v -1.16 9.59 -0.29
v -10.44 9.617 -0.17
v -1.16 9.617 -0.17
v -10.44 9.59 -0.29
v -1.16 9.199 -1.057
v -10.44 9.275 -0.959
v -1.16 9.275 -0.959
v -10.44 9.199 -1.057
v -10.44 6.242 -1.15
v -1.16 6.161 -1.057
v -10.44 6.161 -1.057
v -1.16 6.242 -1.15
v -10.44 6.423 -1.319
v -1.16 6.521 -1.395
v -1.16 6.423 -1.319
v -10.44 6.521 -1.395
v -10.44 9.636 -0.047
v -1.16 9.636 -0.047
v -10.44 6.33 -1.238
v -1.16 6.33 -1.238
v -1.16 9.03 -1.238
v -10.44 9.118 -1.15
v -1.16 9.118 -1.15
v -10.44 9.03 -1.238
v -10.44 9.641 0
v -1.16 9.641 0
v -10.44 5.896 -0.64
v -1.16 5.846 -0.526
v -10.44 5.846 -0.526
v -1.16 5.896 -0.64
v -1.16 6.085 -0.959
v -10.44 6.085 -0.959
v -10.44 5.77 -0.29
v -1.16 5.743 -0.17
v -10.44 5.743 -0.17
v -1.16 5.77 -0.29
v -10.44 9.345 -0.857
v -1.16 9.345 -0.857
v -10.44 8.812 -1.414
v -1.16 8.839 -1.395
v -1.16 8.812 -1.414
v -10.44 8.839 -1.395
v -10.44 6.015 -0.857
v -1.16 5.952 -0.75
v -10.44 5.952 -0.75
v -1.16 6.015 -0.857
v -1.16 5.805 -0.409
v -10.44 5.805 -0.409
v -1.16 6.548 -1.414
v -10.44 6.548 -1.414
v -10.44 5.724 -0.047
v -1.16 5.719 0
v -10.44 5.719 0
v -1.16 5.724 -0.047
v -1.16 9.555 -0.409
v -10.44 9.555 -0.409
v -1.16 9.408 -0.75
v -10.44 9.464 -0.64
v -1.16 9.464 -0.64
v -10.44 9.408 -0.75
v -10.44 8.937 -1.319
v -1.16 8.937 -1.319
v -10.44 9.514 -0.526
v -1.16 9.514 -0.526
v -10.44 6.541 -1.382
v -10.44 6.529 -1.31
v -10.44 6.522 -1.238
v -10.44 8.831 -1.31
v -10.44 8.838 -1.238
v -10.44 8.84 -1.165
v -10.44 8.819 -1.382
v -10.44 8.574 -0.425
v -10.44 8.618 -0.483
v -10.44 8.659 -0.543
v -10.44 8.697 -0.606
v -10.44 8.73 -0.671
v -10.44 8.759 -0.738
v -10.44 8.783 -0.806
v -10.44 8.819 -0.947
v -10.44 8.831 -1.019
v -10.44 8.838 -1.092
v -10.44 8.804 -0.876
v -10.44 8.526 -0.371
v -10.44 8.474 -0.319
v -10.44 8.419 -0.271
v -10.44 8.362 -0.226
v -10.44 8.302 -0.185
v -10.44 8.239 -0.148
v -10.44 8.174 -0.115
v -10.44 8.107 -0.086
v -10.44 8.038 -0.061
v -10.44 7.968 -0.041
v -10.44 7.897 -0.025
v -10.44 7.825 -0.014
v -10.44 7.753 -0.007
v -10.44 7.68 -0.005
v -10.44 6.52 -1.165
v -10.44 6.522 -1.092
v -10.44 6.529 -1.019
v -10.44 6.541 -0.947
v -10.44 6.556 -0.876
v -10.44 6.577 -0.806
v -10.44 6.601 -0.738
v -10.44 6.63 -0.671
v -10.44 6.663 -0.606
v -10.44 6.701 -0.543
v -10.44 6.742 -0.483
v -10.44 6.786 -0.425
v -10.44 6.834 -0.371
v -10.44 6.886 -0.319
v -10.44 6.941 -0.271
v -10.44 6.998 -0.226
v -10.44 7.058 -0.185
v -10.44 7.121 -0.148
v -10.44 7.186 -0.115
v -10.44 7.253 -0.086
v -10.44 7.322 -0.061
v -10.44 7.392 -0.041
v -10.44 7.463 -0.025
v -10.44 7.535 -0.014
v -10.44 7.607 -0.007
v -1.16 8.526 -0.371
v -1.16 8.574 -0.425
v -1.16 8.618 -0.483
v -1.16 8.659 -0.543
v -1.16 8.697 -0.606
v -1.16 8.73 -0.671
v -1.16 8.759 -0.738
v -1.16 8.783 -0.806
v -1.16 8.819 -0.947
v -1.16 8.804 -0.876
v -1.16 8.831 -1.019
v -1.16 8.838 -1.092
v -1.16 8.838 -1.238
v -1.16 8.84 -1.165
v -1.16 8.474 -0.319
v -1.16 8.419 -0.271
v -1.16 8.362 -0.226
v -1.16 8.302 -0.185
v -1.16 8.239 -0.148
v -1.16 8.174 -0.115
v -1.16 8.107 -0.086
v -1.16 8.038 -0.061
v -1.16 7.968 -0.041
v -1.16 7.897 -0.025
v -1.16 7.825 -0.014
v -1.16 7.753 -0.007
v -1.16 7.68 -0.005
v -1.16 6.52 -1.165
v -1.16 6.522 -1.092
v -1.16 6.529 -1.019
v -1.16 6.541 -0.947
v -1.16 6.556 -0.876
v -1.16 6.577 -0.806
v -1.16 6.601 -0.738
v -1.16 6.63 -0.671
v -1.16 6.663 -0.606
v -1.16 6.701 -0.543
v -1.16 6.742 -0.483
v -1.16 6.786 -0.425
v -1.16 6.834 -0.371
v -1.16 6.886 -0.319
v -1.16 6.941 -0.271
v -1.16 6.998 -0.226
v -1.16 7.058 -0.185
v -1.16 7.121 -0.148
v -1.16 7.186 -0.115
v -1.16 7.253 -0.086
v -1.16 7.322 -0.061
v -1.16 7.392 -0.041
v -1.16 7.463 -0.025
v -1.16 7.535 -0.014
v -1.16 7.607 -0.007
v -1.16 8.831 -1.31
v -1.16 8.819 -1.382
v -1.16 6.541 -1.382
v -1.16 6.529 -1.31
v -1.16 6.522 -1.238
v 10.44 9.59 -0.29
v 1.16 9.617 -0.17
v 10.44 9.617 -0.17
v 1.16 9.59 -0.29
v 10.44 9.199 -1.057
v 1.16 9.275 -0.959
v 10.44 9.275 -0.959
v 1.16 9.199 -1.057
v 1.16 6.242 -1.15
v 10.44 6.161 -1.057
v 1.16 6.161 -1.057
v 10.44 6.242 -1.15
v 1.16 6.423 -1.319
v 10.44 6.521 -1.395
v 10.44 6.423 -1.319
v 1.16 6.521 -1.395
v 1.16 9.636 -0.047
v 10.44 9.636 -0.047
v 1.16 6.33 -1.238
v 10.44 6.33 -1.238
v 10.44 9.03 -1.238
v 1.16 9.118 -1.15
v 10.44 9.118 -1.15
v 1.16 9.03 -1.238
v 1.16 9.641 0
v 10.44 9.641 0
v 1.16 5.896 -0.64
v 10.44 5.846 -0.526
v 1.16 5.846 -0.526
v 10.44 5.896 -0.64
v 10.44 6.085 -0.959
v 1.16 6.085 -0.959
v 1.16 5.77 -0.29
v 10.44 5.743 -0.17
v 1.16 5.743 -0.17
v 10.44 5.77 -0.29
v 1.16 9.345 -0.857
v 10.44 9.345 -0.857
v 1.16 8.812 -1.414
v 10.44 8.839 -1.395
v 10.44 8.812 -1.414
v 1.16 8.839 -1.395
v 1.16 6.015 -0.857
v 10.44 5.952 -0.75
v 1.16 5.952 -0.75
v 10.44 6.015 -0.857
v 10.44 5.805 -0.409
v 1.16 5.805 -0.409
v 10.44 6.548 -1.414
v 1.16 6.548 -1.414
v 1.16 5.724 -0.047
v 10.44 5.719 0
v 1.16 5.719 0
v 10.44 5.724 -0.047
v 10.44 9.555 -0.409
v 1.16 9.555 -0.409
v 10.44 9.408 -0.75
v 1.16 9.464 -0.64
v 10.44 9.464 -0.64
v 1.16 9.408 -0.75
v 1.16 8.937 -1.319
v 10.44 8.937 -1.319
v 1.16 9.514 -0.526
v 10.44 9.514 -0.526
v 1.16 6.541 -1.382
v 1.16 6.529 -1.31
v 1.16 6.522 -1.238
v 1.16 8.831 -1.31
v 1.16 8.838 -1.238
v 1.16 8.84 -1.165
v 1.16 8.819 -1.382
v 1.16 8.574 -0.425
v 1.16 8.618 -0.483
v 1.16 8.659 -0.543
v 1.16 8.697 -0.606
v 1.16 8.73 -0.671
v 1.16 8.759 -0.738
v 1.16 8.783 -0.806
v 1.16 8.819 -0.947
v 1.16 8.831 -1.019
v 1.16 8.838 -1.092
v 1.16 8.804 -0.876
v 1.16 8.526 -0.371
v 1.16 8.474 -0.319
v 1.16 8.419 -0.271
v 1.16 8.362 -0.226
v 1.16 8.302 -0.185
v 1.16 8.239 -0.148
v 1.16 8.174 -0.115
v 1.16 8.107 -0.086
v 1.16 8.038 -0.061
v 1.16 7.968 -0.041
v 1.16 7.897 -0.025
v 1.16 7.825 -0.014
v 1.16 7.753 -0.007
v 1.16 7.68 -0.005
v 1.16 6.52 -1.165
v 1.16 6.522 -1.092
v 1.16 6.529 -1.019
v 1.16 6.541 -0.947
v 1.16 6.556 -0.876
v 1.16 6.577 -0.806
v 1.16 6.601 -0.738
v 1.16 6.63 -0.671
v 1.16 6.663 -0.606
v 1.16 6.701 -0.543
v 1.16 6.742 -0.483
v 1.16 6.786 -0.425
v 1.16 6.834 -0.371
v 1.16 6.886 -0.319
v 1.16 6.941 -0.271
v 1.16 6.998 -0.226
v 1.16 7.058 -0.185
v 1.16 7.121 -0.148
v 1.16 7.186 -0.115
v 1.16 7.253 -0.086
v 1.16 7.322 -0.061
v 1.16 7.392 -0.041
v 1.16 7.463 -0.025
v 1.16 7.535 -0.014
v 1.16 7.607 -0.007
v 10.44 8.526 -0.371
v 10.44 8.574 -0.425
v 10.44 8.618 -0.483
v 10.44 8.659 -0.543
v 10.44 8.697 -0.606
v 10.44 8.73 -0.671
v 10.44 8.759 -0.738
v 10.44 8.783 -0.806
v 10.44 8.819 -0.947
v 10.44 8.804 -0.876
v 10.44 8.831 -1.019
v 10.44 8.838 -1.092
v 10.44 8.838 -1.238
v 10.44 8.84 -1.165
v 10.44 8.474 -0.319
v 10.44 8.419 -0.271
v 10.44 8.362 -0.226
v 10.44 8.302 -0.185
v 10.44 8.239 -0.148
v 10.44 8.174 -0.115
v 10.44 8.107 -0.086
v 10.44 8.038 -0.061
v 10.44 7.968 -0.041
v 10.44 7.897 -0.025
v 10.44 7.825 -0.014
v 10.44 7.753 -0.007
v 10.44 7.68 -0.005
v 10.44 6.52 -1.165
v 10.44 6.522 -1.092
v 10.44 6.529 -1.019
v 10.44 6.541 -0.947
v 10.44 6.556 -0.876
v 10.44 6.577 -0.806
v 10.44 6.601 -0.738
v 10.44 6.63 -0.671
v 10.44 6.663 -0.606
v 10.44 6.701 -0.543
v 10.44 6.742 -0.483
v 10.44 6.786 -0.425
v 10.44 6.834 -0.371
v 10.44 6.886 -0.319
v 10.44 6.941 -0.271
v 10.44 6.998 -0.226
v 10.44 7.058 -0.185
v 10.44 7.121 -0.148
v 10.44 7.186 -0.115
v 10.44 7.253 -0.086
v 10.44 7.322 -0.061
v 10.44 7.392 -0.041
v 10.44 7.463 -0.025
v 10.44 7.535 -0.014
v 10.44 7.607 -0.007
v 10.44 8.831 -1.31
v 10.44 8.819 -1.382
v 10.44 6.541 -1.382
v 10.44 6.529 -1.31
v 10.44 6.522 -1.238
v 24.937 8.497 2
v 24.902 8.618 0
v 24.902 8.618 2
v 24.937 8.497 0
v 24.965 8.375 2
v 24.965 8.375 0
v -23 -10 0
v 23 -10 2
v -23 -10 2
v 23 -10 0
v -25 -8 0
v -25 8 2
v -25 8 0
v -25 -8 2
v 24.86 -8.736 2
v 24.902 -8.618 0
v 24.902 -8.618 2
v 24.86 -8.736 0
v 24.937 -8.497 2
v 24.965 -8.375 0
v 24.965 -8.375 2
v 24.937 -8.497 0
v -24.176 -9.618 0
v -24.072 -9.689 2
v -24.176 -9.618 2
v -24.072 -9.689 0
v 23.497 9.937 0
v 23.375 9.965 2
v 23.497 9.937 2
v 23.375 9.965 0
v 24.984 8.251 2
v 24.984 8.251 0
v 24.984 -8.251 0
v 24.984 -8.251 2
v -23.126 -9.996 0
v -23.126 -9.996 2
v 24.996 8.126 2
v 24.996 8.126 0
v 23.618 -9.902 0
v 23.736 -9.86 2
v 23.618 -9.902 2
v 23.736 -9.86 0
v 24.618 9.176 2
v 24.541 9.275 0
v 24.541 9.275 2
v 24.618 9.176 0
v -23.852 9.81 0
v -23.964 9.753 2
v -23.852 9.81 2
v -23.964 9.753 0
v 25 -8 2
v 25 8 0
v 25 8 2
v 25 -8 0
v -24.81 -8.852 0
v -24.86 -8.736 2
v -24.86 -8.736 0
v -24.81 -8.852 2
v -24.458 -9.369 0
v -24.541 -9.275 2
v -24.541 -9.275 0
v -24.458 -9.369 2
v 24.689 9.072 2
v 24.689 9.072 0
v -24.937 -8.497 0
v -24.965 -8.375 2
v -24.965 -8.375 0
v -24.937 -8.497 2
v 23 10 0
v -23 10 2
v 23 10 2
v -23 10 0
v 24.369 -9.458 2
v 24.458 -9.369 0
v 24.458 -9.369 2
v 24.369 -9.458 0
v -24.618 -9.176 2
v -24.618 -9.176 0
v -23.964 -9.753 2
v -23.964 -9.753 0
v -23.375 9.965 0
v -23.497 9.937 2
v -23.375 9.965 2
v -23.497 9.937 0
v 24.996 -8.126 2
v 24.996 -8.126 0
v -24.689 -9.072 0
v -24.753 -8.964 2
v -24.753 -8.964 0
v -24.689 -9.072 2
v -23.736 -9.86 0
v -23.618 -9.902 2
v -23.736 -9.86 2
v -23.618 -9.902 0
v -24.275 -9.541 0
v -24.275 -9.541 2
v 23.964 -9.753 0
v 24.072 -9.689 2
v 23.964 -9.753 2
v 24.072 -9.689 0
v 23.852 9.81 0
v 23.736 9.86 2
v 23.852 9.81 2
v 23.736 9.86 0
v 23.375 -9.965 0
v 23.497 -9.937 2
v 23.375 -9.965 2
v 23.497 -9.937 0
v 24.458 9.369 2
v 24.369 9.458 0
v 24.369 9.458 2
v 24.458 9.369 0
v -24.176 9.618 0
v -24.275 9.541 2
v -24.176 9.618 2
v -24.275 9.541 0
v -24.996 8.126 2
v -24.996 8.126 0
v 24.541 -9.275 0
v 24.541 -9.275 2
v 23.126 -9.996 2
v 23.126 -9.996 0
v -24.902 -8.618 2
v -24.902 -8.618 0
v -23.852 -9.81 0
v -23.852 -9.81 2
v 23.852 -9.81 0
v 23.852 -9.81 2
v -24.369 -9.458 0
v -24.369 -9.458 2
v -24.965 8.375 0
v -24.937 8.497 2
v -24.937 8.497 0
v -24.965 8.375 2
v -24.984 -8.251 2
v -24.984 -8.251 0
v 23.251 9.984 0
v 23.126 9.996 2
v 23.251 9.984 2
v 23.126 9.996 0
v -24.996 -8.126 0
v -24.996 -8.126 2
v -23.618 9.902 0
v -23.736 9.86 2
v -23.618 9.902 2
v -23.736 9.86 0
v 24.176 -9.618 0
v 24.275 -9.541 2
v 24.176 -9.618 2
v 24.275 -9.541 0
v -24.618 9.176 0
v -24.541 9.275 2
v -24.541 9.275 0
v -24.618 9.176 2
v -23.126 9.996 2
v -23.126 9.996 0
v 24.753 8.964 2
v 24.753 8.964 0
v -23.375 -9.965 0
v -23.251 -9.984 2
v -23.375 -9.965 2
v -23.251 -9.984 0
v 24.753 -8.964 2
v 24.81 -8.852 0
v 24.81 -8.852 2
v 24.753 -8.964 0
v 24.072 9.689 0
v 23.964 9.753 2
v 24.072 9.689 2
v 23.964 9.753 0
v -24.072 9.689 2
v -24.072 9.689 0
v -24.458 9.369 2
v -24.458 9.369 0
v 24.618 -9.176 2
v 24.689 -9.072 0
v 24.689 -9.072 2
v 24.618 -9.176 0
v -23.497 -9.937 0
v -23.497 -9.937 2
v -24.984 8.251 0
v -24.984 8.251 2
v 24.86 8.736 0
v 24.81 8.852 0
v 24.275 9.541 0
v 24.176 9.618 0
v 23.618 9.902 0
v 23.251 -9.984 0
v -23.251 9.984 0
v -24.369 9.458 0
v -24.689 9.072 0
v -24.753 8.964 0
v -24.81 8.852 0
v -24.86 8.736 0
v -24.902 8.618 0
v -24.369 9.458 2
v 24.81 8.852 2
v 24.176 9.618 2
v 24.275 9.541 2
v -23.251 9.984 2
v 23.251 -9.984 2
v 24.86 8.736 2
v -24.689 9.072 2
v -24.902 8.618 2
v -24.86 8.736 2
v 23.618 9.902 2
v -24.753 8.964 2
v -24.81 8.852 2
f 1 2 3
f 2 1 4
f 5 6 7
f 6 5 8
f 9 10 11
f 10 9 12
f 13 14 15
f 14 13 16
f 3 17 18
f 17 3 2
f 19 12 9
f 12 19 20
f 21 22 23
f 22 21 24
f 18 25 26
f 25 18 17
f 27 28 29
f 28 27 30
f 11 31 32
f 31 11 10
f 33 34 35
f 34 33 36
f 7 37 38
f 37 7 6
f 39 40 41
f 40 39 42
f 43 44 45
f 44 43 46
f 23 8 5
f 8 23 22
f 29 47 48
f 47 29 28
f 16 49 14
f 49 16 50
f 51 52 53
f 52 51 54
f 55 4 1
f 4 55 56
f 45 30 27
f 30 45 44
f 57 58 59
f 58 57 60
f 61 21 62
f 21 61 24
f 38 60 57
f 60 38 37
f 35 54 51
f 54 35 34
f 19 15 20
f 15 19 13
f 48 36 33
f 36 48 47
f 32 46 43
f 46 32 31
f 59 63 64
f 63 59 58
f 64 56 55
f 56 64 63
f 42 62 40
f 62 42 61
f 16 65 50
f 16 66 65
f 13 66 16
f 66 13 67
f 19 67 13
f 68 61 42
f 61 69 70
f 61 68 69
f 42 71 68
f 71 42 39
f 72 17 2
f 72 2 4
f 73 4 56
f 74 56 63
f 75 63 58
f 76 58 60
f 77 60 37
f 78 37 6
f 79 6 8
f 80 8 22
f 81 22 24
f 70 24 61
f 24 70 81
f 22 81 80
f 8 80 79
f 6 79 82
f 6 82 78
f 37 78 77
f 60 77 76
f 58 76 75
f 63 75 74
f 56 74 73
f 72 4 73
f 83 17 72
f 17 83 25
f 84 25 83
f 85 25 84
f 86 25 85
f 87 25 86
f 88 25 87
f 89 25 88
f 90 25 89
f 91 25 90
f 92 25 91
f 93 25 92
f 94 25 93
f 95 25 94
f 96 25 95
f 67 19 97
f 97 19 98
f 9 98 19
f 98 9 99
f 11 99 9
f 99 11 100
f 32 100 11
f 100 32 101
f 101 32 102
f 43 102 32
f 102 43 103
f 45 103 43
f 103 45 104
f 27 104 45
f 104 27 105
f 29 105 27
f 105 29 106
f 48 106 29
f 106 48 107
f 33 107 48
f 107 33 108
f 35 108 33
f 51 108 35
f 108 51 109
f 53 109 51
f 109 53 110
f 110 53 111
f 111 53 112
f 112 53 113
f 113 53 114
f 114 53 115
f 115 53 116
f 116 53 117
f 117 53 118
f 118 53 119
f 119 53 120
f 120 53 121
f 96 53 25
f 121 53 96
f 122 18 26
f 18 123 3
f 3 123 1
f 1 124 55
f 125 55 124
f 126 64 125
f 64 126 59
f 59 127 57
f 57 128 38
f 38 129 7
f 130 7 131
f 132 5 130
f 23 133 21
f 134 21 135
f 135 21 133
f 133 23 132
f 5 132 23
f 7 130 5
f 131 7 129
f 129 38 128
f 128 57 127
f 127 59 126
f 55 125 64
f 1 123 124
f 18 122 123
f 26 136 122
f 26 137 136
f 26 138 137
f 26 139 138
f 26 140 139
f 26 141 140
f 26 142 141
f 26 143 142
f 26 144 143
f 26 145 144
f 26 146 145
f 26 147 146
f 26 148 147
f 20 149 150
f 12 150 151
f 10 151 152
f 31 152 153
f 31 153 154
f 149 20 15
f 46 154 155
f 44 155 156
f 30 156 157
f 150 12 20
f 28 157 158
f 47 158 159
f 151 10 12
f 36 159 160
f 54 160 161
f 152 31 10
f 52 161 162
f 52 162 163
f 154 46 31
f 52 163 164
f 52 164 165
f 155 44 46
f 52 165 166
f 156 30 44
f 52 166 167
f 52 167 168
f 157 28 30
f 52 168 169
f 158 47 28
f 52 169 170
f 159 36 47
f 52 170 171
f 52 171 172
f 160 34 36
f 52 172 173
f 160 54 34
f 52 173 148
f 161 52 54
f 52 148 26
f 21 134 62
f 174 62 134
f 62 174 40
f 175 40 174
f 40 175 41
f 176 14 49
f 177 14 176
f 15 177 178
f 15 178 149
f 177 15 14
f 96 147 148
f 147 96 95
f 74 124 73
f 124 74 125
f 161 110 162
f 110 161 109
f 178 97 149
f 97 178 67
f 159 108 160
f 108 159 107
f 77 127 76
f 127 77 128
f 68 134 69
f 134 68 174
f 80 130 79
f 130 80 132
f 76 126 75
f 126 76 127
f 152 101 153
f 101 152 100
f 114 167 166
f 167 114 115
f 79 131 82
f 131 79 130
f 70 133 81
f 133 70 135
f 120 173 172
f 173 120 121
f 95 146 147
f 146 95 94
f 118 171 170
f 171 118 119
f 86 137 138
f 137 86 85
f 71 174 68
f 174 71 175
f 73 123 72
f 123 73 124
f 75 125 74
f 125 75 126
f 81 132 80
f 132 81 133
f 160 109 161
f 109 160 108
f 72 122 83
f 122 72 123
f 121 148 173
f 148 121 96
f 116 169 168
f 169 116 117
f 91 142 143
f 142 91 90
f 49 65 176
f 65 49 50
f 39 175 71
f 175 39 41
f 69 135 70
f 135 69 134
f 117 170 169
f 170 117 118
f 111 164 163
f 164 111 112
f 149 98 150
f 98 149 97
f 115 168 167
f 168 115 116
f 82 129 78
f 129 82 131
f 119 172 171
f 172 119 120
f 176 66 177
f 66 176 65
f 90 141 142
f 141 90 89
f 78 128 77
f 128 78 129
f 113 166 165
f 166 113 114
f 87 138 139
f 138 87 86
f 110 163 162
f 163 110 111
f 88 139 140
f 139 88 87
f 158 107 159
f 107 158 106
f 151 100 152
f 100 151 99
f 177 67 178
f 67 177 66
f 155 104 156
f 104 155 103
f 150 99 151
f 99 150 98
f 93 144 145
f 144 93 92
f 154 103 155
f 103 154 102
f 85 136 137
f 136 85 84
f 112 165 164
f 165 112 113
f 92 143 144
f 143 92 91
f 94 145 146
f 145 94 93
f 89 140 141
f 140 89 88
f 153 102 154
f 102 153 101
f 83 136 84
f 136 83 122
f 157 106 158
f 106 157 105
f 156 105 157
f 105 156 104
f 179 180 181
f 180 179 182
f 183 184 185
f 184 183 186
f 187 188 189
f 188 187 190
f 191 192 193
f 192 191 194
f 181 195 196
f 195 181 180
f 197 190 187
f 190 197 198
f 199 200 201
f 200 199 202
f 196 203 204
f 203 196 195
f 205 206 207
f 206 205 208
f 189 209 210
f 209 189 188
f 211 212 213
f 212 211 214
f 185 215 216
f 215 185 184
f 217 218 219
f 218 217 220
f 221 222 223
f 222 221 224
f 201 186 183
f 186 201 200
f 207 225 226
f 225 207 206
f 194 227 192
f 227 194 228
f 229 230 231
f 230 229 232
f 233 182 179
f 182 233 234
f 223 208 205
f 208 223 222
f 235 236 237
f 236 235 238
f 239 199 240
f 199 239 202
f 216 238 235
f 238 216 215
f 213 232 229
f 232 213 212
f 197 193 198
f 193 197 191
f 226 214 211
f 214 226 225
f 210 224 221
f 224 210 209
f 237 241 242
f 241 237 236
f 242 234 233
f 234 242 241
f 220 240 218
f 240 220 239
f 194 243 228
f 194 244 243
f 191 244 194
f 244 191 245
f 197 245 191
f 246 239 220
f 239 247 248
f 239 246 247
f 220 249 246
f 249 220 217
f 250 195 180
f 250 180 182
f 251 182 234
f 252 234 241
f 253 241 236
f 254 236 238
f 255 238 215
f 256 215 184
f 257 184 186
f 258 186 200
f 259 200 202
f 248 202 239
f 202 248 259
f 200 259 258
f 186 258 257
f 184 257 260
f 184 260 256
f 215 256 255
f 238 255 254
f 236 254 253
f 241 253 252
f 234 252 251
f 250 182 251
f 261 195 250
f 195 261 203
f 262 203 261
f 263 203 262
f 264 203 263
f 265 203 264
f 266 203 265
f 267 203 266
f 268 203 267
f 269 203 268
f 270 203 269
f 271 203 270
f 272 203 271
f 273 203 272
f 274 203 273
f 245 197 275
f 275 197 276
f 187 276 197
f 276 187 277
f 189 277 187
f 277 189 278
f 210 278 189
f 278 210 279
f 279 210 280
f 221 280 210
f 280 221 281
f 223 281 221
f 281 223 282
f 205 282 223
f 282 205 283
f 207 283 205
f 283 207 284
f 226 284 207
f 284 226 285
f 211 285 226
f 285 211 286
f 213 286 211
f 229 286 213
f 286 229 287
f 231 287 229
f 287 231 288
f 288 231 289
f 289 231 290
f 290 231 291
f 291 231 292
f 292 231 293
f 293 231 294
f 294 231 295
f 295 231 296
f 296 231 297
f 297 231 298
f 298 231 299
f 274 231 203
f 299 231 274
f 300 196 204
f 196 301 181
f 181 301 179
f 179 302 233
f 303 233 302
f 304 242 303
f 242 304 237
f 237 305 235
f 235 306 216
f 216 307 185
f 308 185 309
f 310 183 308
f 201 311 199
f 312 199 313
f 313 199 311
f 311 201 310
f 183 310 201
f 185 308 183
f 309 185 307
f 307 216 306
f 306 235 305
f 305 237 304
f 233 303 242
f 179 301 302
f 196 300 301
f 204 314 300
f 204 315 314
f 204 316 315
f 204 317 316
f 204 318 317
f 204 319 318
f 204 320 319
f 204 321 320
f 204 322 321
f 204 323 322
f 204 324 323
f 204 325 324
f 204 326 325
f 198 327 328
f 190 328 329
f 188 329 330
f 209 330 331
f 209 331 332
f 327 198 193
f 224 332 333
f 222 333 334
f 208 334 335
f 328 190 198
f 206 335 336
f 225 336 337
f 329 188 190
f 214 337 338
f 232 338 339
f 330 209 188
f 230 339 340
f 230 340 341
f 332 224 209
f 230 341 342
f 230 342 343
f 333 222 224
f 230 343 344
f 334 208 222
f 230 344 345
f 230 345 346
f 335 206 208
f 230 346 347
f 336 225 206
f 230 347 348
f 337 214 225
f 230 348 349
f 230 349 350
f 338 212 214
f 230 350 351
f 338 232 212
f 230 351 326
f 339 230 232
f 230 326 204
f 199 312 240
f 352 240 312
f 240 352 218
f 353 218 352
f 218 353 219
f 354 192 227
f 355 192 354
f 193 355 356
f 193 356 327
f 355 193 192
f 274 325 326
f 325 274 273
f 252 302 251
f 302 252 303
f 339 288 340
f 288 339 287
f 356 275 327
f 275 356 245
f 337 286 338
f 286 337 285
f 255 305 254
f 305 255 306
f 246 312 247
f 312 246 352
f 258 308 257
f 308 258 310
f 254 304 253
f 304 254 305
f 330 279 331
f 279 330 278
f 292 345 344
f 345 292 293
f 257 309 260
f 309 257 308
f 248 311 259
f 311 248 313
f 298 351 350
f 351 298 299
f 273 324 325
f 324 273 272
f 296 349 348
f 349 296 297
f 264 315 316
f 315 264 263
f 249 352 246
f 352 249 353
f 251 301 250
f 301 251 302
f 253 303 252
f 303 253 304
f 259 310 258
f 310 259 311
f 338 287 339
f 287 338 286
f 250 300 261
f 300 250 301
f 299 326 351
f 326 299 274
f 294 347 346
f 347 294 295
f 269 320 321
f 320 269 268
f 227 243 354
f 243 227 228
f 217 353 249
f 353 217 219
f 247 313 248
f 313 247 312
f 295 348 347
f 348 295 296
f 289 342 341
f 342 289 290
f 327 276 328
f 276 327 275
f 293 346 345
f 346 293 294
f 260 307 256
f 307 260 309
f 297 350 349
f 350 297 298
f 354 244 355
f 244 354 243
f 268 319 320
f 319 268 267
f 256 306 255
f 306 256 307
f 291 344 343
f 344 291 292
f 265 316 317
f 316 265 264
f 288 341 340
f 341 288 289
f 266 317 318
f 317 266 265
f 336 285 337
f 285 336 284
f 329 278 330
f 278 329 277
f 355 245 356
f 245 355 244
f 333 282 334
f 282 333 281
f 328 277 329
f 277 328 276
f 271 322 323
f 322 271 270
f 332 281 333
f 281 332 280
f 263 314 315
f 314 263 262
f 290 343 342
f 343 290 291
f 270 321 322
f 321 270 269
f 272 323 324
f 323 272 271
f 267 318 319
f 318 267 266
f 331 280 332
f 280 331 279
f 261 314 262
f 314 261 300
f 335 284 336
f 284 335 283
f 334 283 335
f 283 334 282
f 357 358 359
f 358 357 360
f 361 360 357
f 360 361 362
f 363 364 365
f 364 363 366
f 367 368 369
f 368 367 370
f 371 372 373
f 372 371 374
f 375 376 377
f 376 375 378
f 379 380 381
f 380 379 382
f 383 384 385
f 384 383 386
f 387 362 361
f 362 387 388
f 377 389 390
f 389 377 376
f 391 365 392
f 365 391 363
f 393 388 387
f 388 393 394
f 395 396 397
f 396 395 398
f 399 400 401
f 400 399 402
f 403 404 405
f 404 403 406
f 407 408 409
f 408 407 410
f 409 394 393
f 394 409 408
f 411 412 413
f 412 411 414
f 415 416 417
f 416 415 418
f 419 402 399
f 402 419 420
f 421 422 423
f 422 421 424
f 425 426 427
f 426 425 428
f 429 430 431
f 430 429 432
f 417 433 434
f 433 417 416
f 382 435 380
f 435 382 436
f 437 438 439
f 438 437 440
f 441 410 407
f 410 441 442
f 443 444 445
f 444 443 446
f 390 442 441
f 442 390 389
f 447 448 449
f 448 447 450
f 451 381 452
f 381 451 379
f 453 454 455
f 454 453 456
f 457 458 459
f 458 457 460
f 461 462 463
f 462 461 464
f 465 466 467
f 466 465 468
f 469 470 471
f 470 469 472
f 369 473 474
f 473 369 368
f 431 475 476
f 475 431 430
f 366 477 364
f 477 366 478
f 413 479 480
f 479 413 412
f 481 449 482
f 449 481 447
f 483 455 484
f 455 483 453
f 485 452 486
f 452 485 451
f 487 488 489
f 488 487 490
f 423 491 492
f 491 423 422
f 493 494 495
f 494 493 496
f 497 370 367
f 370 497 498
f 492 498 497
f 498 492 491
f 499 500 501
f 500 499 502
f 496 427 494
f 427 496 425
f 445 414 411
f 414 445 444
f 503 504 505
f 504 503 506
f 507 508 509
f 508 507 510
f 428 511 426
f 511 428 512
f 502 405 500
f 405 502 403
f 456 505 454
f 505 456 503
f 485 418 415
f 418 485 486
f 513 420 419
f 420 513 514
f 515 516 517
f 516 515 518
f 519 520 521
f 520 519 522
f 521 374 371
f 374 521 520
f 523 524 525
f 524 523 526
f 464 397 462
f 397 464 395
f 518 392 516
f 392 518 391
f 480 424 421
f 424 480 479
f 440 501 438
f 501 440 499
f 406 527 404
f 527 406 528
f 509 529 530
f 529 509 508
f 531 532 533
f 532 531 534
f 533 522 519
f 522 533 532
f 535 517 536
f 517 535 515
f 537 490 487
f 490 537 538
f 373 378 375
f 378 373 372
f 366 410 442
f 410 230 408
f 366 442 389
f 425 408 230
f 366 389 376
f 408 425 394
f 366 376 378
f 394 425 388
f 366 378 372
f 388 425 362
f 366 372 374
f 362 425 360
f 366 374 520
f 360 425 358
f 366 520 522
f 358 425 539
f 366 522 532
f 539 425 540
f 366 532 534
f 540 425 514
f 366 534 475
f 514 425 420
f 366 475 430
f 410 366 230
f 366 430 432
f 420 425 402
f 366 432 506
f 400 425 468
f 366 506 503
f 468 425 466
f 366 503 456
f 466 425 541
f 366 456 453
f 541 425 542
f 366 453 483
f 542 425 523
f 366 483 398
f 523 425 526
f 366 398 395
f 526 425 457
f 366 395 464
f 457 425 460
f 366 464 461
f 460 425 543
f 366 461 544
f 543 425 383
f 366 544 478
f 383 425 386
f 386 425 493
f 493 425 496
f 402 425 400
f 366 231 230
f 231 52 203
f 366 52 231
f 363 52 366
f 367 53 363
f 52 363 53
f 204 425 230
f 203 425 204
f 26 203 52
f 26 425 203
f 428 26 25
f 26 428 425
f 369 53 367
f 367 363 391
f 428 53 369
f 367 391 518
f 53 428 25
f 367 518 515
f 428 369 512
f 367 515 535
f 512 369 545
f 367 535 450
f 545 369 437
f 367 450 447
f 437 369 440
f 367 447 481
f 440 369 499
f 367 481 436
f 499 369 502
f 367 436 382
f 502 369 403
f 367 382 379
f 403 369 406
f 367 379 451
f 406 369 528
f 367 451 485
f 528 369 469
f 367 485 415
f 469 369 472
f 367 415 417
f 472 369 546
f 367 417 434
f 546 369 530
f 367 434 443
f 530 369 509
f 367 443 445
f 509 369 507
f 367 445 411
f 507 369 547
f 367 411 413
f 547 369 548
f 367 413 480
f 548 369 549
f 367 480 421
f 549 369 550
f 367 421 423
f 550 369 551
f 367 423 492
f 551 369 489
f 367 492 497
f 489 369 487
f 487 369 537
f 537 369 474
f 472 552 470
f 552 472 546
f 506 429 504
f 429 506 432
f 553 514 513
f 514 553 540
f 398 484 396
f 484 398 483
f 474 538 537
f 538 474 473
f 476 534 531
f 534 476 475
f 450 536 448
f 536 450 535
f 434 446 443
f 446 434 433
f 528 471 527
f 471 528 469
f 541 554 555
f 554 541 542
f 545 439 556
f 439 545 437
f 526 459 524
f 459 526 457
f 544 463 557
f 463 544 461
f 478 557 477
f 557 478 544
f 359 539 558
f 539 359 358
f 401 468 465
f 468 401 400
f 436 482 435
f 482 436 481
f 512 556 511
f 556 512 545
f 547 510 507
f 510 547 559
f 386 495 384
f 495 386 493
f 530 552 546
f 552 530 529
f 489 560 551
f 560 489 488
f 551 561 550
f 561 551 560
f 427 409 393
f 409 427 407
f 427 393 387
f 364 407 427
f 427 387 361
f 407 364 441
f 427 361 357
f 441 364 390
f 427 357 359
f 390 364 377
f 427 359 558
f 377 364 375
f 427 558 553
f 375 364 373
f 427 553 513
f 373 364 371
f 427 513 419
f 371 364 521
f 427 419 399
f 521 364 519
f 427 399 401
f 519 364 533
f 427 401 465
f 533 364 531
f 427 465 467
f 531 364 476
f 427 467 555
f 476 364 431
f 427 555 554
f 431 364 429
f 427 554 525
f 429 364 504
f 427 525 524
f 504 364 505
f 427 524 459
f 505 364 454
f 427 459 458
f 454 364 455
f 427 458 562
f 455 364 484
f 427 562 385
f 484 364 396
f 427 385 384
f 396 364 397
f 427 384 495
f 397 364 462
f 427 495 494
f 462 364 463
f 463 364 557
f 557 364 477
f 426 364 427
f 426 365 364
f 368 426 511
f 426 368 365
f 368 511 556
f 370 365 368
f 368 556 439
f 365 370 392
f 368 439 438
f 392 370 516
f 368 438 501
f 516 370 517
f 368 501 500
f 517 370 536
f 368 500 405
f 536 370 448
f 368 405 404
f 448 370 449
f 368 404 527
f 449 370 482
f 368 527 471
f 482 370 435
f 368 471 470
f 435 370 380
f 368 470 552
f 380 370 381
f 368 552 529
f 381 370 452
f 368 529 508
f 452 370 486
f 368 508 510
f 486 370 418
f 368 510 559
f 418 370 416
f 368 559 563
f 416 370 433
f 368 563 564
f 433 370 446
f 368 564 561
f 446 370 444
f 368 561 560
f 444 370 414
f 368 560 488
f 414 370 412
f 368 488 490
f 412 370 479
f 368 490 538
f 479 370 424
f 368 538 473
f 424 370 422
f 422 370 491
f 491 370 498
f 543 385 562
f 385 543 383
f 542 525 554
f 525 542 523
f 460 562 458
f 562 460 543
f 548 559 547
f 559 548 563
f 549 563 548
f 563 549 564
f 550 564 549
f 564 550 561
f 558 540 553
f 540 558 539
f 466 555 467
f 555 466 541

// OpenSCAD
$labelWidth = 50; // [25:200]
$labelHeight = 20;
$labelThickness = 2;
$labelRadius = 2;

// Wire Shelf Parameters
$vertialWireThickness = 6;
$horizontalWireThickness = 2.32;
$distanceBetweenWires = 11.6;

$fn = 100;

module clip(horizontalWireThickness, distanceBetweenWires) {
    clipDiameter = horizontalWireThickness * 1.7;
    clipHeight = distanceBetweenWires * 0.80;

    difference() {
        cylinder(h = clipHeight, d = clipDiameter, center = true);

        // Cut the cylinder in half (we want a sem-cylinder)
        translate([0, clipDiameter / 4, 0])
        cube([clipDiameter, horizontalWireThickness, clipHeight * 1.1], center = true);

        // Now cut a void into the clip that will hold onto the wire part.
        translate([0, -horizontalWireThickness / 1.7, 0])
        cylinder(h = clipHeight * 1.1, d = horizontalWireThickness, center = true);
    }
}

$YOffsetForClips = $labelHeight/2-$horizontalWireThickness;
$ZOffsetForClips = .2;

// Clip #1
color("red")
translate([-($distanceBetweenWires * 0.80)/2-$horizontalWireThickness/2,$YOffsetForClips,$ZOffsetForClips])
rotate([90,0,90])
clip($horizontalWireThickness, $distanceBetweenWires);

// Clip #2
color("blue")
translate([($distanceBetweenWires * 0.80)/2+$horizontalWireThickness/2,$YOffsetForClips,$ZOffsetForClips])
rotate([90,0,90])
clip($horizontalWireThickness, $distanceBetweenWires);

// Label Body
linear_extrude(height=$labelThickness)
minkowski() {
    // minkowski() adds the circle to the outside.
    // Subtracting keeps the final size exactly WxH.
    square([$labelWidth - 2*$labelRadius, $labelHeight - 2*$labelRadius], center=true);
    circle(r=$labelRadius);
}
